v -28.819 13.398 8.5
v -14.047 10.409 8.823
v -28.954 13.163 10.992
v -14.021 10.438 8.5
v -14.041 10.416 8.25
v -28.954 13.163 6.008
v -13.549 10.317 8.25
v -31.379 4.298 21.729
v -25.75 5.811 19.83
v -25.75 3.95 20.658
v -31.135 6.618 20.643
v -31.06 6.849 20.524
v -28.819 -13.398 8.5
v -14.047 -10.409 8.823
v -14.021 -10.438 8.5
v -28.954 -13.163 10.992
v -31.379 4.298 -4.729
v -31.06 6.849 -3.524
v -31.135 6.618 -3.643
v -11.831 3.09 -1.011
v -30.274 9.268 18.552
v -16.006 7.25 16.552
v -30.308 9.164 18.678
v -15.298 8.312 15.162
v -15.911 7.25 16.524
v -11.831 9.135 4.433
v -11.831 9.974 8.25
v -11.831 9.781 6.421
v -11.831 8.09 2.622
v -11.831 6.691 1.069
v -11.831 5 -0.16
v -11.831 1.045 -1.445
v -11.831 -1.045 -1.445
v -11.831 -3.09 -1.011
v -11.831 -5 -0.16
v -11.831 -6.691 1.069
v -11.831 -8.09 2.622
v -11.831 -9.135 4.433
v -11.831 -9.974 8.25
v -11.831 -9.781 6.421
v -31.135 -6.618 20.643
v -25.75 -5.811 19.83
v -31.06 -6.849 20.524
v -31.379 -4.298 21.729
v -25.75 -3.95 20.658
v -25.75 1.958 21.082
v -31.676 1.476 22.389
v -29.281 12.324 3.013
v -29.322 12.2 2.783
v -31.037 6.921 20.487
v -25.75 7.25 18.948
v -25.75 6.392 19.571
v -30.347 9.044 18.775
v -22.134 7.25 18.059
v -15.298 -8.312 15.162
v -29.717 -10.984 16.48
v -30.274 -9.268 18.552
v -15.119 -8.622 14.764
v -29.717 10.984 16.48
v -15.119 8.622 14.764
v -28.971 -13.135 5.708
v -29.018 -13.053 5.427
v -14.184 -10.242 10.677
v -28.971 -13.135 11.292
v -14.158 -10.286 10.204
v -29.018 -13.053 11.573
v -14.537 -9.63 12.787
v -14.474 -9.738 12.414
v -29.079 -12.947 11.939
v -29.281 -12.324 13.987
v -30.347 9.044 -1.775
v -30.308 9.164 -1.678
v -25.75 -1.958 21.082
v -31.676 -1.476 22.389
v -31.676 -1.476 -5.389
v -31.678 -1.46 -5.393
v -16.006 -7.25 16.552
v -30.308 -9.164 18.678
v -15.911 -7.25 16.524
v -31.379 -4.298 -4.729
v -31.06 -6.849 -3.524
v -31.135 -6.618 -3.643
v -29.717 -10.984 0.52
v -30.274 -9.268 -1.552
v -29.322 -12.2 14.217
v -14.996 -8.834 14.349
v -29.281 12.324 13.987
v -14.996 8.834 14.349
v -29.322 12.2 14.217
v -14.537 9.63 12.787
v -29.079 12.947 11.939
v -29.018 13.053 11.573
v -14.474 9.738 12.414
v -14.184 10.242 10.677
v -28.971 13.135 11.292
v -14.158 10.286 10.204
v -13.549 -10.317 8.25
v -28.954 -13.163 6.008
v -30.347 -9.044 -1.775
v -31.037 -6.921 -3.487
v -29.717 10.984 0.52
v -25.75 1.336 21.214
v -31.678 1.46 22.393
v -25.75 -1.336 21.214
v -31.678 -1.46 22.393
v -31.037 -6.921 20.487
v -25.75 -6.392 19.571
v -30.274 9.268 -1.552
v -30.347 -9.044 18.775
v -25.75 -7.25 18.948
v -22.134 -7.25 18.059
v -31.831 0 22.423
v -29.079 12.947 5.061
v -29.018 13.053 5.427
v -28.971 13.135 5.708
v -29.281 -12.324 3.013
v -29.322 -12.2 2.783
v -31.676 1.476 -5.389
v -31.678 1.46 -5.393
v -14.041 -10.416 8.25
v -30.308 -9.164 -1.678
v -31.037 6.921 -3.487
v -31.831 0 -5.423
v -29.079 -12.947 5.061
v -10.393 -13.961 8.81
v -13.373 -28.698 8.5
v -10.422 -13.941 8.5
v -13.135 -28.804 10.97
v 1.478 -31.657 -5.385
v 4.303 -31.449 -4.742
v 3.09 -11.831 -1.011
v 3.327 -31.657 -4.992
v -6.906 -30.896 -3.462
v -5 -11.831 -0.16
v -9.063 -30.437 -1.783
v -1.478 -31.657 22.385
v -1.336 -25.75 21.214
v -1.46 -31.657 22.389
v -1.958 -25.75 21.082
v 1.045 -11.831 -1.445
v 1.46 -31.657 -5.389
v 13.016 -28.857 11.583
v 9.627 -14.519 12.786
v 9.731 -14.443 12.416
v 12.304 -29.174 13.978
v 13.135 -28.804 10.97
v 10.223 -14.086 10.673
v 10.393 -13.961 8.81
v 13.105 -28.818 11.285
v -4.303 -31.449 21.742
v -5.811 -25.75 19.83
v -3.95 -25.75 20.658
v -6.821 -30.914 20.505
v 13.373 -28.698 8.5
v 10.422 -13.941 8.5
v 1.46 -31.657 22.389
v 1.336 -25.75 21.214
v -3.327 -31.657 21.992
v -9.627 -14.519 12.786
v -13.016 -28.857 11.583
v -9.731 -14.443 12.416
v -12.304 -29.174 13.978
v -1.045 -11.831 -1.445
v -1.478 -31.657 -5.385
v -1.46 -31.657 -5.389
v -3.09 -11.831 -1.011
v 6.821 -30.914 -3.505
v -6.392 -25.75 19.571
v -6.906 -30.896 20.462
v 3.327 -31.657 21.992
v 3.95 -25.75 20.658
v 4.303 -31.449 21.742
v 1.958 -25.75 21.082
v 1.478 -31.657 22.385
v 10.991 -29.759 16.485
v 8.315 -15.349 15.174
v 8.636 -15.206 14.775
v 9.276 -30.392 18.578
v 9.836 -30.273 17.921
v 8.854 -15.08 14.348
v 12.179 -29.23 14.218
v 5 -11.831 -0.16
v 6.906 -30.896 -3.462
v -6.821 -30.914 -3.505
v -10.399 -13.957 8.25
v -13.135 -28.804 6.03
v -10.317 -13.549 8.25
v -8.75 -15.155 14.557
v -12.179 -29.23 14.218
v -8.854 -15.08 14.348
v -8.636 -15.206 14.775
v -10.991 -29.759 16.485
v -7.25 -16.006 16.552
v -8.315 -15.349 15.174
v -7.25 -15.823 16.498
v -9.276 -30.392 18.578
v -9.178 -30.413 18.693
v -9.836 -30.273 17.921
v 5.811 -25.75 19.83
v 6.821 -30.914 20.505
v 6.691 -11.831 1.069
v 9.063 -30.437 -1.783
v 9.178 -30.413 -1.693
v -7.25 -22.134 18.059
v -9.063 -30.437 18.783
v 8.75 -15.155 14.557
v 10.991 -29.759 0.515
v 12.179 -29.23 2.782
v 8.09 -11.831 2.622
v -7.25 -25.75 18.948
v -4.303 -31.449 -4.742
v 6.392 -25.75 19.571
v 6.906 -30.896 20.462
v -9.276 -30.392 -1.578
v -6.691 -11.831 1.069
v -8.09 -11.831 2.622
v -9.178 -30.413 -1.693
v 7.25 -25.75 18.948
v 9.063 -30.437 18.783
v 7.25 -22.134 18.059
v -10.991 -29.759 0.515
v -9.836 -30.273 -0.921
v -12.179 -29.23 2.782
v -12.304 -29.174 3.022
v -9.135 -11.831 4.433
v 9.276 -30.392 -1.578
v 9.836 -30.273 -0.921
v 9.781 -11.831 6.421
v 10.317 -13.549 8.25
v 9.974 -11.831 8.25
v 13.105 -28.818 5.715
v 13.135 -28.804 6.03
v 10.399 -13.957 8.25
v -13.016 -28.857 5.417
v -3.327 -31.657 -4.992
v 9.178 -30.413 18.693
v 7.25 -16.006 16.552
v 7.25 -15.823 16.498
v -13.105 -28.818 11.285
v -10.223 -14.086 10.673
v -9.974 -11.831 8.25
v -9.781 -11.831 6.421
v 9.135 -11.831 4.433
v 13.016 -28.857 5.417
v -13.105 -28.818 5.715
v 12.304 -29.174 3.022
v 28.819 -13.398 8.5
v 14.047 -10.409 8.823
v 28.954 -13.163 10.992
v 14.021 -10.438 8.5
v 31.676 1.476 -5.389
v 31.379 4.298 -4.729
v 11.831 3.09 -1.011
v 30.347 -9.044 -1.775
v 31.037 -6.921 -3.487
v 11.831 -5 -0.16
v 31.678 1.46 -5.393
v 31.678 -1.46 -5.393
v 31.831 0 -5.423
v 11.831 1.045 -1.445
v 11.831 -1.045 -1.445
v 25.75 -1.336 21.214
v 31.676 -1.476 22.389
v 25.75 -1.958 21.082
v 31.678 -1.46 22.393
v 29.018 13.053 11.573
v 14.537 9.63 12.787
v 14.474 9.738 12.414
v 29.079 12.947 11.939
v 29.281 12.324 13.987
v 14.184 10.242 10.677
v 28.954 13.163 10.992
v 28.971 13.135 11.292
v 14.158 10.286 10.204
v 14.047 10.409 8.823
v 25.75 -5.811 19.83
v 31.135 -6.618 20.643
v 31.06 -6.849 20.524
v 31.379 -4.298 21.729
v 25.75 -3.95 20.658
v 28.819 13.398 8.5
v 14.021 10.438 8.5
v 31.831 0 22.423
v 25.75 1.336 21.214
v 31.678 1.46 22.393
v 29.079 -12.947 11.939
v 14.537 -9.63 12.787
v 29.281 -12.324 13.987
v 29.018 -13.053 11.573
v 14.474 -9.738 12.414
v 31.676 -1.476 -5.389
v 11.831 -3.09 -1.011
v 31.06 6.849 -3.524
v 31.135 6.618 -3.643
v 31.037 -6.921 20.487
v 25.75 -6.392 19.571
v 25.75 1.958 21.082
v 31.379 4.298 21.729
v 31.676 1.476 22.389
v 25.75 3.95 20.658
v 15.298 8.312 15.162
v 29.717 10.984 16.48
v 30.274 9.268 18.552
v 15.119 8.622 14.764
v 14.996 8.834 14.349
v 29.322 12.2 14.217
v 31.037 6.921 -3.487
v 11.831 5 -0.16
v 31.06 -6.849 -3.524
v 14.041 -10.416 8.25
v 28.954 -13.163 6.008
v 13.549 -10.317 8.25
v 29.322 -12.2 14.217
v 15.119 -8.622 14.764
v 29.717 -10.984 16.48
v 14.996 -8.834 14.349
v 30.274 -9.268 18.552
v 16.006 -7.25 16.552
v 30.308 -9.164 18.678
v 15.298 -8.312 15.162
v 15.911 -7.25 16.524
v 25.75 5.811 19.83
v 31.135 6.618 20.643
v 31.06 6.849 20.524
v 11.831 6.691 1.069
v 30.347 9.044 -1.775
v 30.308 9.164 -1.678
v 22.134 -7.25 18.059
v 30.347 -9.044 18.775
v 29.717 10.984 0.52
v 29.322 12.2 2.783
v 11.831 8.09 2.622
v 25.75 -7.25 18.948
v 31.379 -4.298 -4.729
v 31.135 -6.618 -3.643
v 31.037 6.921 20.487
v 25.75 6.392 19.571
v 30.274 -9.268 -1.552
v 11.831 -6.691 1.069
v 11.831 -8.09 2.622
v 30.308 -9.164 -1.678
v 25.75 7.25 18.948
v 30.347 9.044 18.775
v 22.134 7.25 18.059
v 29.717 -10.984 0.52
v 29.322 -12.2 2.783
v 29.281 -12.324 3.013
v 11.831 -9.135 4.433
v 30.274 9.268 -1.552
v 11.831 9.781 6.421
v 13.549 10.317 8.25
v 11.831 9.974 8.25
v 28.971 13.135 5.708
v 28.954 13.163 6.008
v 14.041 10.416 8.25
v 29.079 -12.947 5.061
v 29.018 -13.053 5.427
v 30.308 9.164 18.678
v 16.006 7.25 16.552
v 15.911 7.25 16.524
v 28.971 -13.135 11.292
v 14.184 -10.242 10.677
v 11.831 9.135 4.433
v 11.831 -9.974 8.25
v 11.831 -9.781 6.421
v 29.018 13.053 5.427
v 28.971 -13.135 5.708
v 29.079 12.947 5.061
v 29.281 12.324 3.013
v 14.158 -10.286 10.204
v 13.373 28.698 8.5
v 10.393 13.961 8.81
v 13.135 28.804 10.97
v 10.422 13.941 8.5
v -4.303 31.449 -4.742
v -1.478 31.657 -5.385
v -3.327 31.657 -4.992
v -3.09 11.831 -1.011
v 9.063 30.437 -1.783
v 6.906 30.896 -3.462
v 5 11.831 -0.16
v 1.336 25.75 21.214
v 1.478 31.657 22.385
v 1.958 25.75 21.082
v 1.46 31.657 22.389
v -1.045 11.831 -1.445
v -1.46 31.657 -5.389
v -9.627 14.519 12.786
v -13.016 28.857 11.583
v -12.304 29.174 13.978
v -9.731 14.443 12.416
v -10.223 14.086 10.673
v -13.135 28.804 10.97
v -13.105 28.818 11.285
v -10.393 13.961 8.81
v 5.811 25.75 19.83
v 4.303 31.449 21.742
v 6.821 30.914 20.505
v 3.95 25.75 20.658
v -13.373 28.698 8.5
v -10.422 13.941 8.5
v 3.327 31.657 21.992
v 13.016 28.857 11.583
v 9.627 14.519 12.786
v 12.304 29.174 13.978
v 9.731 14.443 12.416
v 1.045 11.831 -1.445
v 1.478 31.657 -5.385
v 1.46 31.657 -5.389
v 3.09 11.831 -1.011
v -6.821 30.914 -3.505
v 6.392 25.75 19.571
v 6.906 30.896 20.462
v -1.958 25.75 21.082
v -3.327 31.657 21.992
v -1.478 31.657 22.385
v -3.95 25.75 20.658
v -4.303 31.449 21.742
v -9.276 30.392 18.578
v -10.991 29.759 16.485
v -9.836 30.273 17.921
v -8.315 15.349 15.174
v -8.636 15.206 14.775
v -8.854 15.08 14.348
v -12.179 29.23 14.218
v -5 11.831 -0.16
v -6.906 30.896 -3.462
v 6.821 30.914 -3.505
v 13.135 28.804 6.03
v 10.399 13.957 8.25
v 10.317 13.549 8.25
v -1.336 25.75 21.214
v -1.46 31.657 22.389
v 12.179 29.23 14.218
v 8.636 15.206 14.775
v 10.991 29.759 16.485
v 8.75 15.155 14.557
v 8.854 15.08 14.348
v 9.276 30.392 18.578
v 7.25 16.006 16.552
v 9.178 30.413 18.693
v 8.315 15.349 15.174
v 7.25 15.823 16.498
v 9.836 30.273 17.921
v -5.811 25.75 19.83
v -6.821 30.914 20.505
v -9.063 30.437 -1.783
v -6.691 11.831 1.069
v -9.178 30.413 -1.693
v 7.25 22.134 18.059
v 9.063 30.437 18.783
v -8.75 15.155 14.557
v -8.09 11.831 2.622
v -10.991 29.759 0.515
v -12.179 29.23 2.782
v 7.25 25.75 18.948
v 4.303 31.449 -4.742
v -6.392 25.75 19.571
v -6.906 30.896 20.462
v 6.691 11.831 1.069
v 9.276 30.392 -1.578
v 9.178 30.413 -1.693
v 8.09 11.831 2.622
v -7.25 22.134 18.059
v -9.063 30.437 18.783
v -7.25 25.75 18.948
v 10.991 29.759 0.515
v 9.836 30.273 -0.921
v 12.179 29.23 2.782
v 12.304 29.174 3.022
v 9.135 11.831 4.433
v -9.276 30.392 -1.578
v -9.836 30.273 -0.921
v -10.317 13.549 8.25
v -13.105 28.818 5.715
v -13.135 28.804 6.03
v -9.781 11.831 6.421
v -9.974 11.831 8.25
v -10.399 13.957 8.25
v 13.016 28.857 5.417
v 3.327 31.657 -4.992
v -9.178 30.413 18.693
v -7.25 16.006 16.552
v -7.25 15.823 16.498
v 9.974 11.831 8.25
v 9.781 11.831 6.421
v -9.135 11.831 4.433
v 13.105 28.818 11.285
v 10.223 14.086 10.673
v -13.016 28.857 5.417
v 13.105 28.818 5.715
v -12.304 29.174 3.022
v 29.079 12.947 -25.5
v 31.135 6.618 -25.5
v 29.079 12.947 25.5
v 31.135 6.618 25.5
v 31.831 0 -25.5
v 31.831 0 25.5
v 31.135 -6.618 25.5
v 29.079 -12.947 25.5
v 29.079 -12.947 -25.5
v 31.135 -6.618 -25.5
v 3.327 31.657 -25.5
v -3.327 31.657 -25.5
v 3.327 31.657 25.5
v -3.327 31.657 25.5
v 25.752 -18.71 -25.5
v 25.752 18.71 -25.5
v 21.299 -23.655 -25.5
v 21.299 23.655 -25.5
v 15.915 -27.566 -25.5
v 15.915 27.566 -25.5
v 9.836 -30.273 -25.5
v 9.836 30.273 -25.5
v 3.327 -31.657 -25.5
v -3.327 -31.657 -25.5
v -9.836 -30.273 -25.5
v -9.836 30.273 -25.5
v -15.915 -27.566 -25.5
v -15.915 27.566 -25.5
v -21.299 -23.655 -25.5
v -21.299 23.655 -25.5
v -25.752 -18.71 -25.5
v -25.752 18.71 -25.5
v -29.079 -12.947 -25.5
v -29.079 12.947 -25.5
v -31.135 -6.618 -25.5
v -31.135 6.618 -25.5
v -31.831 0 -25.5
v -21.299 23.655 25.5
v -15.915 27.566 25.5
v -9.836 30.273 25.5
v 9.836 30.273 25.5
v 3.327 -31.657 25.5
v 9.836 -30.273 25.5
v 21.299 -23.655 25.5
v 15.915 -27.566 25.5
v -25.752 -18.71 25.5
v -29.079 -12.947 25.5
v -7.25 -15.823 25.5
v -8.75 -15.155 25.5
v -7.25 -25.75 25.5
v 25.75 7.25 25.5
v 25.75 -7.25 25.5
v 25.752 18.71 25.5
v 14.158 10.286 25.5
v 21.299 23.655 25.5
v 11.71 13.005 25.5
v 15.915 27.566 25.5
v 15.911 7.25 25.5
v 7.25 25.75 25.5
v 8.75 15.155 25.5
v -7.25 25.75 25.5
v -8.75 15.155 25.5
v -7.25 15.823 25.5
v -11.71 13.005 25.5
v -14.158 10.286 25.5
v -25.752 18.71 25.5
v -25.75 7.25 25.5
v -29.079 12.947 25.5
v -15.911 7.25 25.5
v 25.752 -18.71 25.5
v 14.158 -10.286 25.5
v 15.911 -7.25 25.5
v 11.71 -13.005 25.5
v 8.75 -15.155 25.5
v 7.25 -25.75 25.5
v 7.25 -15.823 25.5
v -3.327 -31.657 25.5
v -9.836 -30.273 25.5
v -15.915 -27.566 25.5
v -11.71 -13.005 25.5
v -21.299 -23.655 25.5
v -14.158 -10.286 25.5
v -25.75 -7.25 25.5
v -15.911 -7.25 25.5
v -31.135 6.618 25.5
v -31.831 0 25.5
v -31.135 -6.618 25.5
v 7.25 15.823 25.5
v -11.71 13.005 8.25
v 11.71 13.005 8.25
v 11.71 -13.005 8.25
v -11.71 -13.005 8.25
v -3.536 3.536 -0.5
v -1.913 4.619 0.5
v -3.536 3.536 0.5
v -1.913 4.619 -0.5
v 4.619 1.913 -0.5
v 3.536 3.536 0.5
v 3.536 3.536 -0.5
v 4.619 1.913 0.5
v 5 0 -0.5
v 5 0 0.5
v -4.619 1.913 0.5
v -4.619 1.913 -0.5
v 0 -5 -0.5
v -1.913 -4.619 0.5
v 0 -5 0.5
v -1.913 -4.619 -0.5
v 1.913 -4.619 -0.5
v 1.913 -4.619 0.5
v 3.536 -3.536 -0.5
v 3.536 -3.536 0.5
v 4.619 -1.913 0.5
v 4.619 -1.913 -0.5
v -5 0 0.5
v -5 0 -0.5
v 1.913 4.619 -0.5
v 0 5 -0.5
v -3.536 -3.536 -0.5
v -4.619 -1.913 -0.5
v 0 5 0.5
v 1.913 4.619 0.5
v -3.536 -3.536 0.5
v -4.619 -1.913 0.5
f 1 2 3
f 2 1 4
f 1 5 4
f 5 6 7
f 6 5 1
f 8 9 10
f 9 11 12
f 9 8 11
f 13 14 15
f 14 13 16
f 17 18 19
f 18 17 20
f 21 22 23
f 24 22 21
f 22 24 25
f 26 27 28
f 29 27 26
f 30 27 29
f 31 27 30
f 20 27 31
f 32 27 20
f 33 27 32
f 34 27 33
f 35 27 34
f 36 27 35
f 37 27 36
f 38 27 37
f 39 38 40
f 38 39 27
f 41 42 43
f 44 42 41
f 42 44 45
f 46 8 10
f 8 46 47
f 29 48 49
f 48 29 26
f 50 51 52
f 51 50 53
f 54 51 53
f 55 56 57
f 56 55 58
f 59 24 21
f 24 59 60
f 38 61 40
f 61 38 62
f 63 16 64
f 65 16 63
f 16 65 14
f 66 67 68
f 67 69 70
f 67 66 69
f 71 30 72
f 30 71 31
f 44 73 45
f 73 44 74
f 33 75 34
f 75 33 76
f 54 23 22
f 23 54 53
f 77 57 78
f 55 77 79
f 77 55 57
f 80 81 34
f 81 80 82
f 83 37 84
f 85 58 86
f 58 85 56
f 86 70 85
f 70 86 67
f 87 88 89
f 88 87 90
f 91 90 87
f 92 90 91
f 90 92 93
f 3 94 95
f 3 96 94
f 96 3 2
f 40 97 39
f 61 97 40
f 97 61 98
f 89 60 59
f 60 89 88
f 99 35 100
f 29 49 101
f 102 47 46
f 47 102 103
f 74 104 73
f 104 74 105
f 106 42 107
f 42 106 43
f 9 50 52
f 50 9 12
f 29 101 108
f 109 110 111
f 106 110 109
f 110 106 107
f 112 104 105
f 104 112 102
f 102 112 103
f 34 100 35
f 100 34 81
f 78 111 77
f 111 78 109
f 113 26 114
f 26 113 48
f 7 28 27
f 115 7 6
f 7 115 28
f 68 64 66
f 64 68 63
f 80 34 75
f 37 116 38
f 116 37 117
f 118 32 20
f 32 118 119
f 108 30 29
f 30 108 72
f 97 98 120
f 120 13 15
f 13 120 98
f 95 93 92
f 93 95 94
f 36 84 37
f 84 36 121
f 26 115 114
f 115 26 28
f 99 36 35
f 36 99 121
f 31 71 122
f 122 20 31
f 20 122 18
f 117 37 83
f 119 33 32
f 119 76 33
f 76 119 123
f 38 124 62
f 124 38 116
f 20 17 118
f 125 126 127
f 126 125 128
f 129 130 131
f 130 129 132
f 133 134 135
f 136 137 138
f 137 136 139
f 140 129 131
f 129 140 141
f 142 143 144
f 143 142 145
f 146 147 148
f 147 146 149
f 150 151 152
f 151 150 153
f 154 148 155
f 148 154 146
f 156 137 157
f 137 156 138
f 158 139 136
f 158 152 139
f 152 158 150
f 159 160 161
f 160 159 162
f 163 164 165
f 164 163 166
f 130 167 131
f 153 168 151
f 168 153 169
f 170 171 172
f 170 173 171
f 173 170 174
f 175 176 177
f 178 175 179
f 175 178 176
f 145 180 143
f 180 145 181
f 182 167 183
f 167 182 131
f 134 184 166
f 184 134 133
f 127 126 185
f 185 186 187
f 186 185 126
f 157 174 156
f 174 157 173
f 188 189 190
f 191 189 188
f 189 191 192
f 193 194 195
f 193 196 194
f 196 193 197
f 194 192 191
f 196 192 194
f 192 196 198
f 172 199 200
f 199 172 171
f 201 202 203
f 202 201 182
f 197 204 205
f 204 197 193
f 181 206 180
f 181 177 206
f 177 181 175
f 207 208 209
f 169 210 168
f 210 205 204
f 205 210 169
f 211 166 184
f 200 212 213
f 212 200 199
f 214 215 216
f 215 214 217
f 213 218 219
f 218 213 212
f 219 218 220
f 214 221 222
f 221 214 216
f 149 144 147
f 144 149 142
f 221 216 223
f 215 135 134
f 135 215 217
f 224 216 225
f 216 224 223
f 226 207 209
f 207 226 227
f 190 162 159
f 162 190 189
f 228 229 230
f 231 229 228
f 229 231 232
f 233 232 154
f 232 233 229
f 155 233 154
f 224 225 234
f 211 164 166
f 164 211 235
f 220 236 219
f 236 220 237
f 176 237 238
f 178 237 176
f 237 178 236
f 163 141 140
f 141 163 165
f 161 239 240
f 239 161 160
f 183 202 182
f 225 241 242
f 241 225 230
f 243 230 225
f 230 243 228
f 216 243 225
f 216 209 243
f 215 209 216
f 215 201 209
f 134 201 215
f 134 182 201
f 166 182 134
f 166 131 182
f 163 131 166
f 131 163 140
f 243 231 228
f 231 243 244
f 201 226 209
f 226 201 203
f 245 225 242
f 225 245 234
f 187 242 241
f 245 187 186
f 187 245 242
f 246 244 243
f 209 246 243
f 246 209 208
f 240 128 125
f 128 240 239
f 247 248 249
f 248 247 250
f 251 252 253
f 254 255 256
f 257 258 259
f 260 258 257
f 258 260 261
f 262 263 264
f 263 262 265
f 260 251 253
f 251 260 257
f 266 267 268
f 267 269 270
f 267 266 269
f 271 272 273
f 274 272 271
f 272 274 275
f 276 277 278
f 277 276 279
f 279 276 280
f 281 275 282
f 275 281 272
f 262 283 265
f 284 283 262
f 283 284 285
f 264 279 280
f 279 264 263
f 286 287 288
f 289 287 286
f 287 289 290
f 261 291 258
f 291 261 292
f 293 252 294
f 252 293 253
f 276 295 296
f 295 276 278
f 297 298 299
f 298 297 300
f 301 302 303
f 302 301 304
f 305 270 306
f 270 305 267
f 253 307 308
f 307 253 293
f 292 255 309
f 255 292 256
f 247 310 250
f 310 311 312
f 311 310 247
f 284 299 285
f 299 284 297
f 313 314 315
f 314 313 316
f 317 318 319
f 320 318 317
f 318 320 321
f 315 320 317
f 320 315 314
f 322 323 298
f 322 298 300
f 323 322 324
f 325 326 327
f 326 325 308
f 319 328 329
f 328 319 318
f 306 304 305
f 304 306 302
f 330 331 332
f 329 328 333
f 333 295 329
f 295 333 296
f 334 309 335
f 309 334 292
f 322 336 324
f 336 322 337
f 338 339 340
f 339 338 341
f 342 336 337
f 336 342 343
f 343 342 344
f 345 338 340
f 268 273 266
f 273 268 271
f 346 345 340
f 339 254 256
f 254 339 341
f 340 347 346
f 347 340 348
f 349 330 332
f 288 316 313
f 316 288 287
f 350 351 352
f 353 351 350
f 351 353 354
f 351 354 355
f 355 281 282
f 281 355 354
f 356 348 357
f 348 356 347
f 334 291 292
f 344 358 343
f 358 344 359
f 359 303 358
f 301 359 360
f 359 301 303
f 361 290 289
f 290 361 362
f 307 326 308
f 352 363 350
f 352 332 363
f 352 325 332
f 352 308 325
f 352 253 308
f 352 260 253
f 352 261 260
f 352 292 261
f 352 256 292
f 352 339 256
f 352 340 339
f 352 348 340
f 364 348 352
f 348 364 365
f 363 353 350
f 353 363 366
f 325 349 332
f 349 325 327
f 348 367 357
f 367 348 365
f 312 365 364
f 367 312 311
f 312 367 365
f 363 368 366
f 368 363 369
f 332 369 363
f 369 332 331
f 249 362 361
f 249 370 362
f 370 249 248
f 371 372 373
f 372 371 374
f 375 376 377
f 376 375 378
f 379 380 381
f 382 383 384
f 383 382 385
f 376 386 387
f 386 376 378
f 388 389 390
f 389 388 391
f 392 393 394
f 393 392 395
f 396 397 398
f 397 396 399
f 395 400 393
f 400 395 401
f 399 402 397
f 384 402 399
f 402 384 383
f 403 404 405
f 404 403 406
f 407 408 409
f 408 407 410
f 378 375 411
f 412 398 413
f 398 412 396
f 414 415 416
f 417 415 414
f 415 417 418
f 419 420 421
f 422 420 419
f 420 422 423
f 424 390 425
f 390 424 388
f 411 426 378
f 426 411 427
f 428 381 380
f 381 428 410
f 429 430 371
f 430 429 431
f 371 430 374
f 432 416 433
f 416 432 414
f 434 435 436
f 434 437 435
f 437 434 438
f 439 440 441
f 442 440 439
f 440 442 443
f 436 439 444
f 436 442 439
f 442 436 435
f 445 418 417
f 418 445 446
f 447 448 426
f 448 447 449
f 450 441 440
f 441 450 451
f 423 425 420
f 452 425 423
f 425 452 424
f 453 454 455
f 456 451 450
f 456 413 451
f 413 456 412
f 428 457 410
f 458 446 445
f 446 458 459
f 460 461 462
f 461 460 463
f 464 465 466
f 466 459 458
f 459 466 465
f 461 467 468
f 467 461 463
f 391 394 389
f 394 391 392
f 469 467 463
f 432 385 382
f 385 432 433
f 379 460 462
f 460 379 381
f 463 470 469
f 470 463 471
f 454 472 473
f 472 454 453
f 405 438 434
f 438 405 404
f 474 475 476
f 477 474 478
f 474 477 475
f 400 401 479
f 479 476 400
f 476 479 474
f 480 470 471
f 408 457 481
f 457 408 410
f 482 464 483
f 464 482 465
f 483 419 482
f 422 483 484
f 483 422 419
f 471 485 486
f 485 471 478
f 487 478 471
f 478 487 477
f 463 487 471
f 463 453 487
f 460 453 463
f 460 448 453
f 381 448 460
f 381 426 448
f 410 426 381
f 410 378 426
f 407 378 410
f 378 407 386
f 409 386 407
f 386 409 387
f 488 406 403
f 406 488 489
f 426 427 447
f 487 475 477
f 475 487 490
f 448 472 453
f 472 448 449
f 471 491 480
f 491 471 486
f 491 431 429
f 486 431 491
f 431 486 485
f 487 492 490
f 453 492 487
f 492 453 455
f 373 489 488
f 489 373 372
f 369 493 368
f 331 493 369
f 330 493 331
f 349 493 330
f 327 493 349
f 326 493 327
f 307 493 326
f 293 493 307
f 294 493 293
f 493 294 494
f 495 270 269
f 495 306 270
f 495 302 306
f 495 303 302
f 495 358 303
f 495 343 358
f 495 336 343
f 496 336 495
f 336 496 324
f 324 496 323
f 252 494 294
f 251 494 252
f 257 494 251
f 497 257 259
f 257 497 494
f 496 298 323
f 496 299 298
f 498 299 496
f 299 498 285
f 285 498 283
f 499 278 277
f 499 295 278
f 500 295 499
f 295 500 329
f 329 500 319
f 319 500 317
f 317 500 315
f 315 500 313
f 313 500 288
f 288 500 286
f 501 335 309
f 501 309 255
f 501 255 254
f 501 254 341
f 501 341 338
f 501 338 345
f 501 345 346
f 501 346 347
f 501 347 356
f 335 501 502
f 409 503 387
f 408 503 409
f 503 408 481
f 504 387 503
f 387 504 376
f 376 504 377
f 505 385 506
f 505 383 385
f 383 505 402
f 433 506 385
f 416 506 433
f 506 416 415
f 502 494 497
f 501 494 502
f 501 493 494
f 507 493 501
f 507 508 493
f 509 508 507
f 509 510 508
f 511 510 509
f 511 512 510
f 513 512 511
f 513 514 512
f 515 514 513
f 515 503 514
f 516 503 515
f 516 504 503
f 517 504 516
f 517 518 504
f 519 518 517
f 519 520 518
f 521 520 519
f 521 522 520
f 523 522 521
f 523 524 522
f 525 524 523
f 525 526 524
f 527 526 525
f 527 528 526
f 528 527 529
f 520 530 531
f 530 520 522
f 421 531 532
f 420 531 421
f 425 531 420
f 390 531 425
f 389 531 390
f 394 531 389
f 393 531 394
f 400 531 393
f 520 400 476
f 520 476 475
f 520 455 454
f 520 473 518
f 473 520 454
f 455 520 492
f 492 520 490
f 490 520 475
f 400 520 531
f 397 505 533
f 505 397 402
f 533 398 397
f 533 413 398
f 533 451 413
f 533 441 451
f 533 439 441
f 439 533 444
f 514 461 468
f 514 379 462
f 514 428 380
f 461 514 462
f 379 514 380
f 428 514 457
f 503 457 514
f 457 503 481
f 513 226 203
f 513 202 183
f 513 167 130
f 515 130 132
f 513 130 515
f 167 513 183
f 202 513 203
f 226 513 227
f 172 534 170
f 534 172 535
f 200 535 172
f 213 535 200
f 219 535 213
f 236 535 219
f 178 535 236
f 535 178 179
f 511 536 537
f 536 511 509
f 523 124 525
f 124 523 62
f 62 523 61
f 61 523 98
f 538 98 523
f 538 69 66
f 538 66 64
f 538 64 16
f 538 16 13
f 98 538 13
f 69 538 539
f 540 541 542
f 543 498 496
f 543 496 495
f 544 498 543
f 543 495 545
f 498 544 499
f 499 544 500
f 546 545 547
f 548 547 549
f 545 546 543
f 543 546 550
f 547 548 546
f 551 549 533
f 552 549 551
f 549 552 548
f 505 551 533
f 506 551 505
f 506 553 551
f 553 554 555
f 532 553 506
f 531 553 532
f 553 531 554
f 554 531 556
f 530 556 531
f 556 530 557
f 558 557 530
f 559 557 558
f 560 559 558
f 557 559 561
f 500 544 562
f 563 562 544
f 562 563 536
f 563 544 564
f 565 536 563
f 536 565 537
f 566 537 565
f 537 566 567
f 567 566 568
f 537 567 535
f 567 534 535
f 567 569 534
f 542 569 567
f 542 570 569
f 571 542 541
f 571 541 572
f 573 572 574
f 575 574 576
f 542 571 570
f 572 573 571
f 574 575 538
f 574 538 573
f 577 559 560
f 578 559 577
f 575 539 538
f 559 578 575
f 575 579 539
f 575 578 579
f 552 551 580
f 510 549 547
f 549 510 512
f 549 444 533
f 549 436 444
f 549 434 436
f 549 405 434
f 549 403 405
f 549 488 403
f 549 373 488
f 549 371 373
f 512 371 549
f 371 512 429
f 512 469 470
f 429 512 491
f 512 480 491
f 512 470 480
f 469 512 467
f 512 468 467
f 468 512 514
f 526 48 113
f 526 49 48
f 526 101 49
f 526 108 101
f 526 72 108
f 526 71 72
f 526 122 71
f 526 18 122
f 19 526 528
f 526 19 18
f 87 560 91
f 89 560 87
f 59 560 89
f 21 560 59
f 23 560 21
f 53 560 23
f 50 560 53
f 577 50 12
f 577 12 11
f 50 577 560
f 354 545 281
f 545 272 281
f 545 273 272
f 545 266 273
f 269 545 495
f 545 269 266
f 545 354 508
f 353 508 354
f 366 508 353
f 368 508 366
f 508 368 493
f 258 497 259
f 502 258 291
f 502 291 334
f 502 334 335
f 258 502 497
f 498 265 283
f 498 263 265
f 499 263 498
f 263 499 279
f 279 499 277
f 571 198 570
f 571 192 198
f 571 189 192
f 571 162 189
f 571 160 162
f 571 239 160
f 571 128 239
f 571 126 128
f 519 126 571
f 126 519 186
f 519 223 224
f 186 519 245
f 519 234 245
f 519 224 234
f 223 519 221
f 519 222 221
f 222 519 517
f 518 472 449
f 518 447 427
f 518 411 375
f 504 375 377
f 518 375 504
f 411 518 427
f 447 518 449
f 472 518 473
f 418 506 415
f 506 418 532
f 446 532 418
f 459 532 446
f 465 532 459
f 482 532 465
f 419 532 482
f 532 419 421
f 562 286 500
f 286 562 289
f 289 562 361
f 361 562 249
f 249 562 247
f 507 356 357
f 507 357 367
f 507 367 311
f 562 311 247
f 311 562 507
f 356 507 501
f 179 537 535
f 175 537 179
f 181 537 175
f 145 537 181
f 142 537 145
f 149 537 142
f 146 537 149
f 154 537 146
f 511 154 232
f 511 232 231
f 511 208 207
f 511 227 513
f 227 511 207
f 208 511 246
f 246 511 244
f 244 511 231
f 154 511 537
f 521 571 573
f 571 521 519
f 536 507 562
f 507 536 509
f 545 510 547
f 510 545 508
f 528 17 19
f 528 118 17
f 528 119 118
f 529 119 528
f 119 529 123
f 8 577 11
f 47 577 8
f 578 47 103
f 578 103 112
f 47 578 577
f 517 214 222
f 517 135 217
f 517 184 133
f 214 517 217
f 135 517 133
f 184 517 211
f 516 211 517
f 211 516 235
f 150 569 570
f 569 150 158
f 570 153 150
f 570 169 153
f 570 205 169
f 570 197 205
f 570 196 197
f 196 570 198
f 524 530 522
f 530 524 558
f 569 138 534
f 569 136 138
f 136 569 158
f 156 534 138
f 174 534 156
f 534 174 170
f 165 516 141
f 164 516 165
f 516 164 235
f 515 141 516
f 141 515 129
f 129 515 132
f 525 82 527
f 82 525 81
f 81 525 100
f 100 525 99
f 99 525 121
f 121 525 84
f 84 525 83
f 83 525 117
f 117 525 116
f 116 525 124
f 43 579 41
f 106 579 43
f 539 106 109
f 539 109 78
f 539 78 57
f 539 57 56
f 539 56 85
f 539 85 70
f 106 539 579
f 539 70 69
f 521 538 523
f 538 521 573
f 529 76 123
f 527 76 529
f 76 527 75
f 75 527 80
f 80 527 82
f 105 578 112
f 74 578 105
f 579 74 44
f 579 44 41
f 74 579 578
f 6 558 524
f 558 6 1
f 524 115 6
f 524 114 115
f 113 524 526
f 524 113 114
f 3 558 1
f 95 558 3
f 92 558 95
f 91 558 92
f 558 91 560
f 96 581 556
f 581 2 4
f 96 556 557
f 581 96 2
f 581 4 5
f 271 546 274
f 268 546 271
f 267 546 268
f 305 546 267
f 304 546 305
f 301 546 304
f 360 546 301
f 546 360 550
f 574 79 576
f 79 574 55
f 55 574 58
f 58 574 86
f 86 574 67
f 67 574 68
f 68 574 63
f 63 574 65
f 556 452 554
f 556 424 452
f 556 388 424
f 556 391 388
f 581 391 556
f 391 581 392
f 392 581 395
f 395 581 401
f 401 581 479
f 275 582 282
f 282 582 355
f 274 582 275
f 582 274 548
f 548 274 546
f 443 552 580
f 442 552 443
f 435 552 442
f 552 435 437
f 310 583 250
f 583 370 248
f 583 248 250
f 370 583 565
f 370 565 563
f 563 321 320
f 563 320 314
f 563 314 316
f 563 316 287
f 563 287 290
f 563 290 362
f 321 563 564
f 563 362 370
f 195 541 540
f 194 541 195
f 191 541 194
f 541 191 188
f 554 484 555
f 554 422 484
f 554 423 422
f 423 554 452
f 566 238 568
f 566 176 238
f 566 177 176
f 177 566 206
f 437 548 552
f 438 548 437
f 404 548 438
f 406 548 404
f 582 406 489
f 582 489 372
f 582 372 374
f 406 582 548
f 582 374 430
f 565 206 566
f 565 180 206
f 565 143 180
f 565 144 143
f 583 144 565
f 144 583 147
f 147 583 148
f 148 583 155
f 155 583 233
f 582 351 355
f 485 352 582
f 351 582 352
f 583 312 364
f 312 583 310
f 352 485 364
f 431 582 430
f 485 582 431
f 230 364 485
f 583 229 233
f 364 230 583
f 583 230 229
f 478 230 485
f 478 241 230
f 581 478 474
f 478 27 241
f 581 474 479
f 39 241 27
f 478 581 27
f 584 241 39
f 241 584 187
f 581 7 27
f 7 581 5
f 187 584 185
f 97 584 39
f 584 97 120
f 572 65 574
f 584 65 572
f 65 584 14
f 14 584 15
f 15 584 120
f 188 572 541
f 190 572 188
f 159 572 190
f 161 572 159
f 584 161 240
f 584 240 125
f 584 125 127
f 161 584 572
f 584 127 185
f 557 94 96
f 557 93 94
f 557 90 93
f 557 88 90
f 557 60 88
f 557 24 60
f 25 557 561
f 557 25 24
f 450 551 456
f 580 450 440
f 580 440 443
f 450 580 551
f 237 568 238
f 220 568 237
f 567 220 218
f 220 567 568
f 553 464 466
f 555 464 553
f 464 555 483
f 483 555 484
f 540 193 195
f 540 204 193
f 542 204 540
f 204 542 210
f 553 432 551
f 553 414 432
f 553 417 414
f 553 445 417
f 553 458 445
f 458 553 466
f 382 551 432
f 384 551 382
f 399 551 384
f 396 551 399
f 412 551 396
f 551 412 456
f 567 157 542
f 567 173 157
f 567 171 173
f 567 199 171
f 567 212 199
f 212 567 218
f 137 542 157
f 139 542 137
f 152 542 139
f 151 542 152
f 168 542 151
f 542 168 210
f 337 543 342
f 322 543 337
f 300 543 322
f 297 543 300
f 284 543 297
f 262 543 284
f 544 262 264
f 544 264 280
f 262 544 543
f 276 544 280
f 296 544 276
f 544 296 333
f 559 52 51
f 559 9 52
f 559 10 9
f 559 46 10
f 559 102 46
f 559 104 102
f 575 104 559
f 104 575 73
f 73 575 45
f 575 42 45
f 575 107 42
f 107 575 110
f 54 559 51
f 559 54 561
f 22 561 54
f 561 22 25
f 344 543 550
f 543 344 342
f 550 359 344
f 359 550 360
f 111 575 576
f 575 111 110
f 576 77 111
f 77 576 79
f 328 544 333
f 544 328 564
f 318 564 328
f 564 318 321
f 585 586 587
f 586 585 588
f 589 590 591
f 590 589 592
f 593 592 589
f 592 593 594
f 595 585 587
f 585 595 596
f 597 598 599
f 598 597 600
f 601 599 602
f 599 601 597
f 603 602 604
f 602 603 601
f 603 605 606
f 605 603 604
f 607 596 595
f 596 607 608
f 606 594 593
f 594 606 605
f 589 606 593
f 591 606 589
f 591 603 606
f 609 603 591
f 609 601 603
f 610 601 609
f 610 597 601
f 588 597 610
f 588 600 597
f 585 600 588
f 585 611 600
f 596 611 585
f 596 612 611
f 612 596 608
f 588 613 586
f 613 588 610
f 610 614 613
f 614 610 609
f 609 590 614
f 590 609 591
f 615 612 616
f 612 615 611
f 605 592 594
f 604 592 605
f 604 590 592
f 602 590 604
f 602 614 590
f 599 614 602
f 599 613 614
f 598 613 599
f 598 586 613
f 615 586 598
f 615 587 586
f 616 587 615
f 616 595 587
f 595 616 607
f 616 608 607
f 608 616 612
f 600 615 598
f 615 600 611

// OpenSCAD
module barbie_gearbox(wiggle)
{
    height=16.5;
    radius=16;
    cube_width=13;
    cube_diameter=50;
    translate([0,0,-height/2])
    {
        cylinder(height+wiggle.z,radius+wiggle.x,radius+wiggle.x,center=true);
        cube([cube_width,cube_diameter,height]+wiggle,center=true);
        cube([cube_diameter,cube_width,height]+wiggle,center=true);
    }
}

module barbie_adapter(bolt_r=5,height=40,ceil=0,floor=4,peg_or=14,peg_ir=10,peg_num=4,peg_h=20,gearbox_offset=0)
{
    epsilon=0.001;
    circ=peg_num*50;
    radius=circ/(2*PI);
    real_height=height+ceil+floor;
    
    difference()
    {
        difference()
        {
            difference()
            {
                cylinder(real_height,radius,radius,center=true);

                translate([0,0,-real_height/2+peg_or+floor])
                    for(ii=[1:peg_num])
                        rotate(ii*360/peg_num,[0,0,1])
                            translate([0,radius-peg_h/2,0])
                                rotate(90,[1,0,0])
                                    cylinder(peg_h,peg_or,peg_ir,center=true);
            }

            translate([0,0,real_height/2])
                rotate(gearbox_offset,[0,0,1])
                    barbie_gearbox([1.5,1.5,1.5]);
        }

        cylinder(height+epsilon,bolt_r,bolt_r,center=true);
    }
}

barbie_adapter(height=1,peg_num=4,gearbox_offset=0,ceil=30,floor=20);
